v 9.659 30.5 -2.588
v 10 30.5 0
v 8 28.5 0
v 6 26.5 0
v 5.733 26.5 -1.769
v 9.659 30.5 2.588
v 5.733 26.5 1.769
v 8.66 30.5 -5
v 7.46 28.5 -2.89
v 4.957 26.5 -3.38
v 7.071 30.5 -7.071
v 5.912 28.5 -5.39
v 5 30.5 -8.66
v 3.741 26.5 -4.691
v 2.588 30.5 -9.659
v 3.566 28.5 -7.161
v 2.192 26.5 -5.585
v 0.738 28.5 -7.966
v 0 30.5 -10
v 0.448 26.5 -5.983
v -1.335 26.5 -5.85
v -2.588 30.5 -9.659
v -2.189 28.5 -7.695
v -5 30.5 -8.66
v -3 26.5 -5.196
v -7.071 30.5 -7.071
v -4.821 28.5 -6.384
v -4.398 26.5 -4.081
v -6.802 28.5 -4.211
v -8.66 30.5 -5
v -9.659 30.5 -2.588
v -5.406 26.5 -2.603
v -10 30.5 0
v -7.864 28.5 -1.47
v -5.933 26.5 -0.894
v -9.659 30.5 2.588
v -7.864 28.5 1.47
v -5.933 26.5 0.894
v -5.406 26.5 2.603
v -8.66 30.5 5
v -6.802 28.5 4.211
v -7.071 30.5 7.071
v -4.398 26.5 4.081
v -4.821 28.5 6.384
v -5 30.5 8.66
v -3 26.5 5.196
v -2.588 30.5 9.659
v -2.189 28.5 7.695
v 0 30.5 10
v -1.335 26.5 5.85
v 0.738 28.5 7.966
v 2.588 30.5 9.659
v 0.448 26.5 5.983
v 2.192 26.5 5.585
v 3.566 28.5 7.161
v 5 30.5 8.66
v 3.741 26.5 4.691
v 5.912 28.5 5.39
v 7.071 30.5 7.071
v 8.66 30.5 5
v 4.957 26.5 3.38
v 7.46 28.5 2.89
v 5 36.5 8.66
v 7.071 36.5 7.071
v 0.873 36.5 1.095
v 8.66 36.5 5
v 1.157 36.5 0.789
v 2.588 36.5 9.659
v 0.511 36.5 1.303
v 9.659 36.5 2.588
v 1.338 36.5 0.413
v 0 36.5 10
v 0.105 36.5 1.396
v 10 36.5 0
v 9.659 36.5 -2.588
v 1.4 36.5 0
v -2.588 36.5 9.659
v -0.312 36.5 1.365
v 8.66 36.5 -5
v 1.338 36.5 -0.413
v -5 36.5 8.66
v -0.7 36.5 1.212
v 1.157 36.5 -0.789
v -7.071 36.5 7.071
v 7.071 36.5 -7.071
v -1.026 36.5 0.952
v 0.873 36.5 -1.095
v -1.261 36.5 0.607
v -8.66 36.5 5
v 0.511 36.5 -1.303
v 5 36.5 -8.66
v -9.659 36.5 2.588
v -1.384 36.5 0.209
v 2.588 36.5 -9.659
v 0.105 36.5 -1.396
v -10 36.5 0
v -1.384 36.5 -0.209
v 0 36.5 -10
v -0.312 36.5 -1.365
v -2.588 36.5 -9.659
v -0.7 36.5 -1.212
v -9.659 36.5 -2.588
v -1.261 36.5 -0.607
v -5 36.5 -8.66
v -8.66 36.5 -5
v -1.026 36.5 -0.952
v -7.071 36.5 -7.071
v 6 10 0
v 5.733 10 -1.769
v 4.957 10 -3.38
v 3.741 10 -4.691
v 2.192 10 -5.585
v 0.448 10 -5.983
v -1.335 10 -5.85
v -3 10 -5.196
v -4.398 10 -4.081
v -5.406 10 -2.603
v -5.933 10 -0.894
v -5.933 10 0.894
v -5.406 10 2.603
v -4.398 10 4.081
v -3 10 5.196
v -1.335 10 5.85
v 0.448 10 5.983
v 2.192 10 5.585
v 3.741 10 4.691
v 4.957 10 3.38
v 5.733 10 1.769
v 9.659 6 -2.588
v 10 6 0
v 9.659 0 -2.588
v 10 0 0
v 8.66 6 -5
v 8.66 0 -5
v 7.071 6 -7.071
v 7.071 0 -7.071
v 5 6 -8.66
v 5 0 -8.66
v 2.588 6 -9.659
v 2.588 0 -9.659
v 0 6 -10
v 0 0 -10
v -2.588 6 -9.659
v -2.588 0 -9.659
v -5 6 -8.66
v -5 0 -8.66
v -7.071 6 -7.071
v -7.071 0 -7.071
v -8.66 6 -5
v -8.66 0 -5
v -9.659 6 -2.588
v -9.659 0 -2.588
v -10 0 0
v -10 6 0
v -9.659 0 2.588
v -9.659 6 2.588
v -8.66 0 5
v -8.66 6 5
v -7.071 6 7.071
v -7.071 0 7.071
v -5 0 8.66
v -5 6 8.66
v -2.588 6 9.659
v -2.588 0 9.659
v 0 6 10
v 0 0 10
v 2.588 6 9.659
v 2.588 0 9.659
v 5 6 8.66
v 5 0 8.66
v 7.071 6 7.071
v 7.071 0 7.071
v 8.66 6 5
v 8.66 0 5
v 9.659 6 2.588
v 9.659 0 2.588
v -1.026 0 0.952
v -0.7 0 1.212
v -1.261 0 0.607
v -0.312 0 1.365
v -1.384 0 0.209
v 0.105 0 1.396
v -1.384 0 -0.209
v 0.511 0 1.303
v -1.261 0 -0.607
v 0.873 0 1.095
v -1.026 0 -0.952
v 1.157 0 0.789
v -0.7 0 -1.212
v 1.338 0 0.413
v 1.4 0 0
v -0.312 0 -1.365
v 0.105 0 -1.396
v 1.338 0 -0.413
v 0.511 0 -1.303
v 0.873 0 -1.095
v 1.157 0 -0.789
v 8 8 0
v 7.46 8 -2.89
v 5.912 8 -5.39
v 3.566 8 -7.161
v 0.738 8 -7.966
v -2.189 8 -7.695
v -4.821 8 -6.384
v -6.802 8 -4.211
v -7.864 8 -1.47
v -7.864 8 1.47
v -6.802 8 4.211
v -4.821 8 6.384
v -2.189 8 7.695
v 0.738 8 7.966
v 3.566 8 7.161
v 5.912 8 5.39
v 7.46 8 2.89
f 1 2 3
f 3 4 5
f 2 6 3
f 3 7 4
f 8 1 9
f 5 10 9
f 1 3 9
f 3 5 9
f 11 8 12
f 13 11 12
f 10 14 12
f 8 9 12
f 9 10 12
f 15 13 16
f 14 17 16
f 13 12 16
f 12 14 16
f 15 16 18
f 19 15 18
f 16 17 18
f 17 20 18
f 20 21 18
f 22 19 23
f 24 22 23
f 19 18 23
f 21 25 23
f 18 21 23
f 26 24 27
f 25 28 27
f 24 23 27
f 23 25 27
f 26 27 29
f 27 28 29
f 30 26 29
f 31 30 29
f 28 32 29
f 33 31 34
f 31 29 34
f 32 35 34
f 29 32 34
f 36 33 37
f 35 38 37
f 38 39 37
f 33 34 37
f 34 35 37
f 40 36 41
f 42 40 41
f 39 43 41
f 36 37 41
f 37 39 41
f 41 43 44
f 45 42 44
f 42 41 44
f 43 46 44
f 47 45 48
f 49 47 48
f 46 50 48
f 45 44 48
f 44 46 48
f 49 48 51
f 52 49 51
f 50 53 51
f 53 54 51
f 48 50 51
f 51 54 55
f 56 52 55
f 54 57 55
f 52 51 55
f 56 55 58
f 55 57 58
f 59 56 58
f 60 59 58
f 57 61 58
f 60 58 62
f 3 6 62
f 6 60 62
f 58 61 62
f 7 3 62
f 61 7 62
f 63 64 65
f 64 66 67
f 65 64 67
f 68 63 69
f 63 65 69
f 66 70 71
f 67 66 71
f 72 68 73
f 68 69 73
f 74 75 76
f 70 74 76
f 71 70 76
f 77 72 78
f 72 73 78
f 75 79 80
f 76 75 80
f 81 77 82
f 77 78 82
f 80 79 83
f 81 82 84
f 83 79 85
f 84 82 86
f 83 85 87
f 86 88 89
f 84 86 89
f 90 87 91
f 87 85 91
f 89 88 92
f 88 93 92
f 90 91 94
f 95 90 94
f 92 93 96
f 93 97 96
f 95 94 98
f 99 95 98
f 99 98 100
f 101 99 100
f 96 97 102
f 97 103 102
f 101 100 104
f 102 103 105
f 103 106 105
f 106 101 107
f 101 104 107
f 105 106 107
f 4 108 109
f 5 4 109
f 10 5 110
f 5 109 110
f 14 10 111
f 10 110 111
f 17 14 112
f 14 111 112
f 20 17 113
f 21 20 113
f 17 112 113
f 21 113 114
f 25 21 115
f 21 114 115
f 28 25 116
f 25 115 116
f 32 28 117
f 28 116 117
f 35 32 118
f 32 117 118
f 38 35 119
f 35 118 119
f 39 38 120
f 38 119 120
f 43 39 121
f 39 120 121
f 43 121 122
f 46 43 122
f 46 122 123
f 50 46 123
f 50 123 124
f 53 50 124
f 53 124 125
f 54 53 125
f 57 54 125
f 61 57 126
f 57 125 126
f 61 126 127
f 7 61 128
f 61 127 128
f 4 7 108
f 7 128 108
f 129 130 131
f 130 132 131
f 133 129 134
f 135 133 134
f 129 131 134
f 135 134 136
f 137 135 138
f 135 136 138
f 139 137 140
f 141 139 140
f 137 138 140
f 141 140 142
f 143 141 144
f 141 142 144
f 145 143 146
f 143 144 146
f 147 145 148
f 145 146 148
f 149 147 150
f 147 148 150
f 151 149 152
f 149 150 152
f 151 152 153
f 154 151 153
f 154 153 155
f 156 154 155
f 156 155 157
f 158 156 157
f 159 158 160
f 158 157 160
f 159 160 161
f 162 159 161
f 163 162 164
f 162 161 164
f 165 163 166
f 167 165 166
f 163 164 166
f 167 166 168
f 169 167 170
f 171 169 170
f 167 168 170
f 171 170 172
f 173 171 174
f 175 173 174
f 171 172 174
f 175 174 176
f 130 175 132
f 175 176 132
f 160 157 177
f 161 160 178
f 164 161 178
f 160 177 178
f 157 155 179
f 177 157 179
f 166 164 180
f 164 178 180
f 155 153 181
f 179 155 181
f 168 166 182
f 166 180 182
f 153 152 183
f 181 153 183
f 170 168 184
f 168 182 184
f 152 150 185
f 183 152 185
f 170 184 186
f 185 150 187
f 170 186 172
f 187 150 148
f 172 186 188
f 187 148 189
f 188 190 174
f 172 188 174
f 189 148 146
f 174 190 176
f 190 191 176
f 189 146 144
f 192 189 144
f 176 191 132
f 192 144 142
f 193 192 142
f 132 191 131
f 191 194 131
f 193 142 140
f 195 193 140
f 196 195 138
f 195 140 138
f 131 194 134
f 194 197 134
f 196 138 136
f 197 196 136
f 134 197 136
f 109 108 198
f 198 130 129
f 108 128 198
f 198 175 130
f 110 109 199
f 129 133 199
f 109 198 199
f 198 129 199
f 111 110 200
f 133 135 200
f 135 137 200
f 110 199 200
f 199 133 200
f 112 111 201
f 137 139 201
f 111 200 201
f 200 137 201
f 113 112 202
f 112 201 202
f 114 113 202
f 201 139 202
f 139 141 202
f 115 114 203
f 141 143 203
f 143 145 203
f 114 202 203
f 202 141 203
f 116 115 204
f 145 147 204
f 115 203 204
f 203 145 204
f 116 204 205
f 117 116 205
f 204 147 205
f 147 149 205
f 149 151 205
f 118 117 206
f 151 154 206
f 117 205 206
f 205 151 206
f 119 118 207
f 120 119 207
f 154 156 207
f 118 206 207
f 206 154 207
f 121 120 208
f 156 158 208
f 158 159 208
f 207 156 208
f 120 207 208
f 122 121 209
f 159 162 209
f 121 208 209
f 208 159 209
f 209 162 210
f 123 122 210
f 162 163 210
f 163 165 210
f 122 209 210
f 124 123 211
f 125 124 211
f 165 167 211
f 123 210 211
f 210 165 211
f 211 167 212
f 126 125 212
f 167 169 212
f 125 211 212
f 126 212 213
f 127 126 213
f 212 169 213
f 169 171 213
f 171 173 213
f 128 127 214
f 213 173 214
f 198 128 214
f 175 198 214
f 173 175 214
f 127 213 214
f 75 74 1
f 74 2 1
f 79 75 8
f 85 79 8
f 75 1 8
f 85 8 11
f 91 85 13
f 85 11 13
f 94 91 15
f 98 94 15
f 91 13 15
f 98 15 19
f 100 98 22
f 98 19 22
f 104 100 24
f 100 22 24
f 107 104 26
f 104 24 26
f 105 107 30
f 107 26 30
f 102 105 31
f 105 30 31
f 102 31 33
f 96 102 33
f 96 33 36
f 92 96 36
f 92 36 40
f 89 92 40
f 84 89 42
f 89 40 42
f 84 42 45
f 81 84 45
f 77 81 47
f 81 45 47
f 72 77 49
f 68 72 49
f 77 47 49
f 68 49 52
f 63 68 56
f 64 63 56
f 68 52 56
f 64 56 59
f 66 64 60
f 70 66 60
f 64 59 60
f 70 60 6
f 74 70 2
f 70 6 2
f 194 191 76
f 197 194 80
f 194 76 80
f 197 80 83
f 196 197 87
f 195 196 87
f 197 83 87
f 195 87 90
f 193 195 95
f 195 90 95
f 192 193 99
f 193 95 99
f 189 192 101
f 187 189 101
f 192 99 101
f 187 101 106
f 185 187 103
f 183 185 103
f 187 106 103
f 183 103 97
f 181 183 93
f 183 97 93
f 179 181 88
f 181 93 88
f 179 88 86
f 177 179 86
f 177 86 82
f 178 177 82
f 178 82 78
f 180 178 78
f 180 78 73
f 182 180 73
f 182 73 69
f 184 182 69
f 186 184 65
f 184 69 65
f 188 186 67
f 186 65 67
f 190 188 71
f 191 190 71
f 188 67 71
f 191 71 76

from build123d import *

# Parameters (mm, degrees)
CHAMFER1_SIZE = 4


with BuildPart() as part:
    # Sketch1 → Revolve1 (revolve)
    with BuildSketch(Plane.XY):
        Polygon((1.4, 0), (1.4, 36.5), (10, 36.5), (10, 30.5), (6, 30.5), (6, 6), (10, 6), (10, 0), align=None)
    revolve(axis=Axis((0, -42.821890518, 0), (0, 1, 0)))

    # Chamfer1
    chamfer1_edges = [part.edges().sort_by_distance(p)[0] for p in [
        (-6, 6, 0),
        (-6, 30.5, 0),
    ]]
    chamfer(chamfer1_edges, length=CHAMFER1_SIZE - 0.0001)  # a hair under: the kernel refuses the full size


solid = part.part
